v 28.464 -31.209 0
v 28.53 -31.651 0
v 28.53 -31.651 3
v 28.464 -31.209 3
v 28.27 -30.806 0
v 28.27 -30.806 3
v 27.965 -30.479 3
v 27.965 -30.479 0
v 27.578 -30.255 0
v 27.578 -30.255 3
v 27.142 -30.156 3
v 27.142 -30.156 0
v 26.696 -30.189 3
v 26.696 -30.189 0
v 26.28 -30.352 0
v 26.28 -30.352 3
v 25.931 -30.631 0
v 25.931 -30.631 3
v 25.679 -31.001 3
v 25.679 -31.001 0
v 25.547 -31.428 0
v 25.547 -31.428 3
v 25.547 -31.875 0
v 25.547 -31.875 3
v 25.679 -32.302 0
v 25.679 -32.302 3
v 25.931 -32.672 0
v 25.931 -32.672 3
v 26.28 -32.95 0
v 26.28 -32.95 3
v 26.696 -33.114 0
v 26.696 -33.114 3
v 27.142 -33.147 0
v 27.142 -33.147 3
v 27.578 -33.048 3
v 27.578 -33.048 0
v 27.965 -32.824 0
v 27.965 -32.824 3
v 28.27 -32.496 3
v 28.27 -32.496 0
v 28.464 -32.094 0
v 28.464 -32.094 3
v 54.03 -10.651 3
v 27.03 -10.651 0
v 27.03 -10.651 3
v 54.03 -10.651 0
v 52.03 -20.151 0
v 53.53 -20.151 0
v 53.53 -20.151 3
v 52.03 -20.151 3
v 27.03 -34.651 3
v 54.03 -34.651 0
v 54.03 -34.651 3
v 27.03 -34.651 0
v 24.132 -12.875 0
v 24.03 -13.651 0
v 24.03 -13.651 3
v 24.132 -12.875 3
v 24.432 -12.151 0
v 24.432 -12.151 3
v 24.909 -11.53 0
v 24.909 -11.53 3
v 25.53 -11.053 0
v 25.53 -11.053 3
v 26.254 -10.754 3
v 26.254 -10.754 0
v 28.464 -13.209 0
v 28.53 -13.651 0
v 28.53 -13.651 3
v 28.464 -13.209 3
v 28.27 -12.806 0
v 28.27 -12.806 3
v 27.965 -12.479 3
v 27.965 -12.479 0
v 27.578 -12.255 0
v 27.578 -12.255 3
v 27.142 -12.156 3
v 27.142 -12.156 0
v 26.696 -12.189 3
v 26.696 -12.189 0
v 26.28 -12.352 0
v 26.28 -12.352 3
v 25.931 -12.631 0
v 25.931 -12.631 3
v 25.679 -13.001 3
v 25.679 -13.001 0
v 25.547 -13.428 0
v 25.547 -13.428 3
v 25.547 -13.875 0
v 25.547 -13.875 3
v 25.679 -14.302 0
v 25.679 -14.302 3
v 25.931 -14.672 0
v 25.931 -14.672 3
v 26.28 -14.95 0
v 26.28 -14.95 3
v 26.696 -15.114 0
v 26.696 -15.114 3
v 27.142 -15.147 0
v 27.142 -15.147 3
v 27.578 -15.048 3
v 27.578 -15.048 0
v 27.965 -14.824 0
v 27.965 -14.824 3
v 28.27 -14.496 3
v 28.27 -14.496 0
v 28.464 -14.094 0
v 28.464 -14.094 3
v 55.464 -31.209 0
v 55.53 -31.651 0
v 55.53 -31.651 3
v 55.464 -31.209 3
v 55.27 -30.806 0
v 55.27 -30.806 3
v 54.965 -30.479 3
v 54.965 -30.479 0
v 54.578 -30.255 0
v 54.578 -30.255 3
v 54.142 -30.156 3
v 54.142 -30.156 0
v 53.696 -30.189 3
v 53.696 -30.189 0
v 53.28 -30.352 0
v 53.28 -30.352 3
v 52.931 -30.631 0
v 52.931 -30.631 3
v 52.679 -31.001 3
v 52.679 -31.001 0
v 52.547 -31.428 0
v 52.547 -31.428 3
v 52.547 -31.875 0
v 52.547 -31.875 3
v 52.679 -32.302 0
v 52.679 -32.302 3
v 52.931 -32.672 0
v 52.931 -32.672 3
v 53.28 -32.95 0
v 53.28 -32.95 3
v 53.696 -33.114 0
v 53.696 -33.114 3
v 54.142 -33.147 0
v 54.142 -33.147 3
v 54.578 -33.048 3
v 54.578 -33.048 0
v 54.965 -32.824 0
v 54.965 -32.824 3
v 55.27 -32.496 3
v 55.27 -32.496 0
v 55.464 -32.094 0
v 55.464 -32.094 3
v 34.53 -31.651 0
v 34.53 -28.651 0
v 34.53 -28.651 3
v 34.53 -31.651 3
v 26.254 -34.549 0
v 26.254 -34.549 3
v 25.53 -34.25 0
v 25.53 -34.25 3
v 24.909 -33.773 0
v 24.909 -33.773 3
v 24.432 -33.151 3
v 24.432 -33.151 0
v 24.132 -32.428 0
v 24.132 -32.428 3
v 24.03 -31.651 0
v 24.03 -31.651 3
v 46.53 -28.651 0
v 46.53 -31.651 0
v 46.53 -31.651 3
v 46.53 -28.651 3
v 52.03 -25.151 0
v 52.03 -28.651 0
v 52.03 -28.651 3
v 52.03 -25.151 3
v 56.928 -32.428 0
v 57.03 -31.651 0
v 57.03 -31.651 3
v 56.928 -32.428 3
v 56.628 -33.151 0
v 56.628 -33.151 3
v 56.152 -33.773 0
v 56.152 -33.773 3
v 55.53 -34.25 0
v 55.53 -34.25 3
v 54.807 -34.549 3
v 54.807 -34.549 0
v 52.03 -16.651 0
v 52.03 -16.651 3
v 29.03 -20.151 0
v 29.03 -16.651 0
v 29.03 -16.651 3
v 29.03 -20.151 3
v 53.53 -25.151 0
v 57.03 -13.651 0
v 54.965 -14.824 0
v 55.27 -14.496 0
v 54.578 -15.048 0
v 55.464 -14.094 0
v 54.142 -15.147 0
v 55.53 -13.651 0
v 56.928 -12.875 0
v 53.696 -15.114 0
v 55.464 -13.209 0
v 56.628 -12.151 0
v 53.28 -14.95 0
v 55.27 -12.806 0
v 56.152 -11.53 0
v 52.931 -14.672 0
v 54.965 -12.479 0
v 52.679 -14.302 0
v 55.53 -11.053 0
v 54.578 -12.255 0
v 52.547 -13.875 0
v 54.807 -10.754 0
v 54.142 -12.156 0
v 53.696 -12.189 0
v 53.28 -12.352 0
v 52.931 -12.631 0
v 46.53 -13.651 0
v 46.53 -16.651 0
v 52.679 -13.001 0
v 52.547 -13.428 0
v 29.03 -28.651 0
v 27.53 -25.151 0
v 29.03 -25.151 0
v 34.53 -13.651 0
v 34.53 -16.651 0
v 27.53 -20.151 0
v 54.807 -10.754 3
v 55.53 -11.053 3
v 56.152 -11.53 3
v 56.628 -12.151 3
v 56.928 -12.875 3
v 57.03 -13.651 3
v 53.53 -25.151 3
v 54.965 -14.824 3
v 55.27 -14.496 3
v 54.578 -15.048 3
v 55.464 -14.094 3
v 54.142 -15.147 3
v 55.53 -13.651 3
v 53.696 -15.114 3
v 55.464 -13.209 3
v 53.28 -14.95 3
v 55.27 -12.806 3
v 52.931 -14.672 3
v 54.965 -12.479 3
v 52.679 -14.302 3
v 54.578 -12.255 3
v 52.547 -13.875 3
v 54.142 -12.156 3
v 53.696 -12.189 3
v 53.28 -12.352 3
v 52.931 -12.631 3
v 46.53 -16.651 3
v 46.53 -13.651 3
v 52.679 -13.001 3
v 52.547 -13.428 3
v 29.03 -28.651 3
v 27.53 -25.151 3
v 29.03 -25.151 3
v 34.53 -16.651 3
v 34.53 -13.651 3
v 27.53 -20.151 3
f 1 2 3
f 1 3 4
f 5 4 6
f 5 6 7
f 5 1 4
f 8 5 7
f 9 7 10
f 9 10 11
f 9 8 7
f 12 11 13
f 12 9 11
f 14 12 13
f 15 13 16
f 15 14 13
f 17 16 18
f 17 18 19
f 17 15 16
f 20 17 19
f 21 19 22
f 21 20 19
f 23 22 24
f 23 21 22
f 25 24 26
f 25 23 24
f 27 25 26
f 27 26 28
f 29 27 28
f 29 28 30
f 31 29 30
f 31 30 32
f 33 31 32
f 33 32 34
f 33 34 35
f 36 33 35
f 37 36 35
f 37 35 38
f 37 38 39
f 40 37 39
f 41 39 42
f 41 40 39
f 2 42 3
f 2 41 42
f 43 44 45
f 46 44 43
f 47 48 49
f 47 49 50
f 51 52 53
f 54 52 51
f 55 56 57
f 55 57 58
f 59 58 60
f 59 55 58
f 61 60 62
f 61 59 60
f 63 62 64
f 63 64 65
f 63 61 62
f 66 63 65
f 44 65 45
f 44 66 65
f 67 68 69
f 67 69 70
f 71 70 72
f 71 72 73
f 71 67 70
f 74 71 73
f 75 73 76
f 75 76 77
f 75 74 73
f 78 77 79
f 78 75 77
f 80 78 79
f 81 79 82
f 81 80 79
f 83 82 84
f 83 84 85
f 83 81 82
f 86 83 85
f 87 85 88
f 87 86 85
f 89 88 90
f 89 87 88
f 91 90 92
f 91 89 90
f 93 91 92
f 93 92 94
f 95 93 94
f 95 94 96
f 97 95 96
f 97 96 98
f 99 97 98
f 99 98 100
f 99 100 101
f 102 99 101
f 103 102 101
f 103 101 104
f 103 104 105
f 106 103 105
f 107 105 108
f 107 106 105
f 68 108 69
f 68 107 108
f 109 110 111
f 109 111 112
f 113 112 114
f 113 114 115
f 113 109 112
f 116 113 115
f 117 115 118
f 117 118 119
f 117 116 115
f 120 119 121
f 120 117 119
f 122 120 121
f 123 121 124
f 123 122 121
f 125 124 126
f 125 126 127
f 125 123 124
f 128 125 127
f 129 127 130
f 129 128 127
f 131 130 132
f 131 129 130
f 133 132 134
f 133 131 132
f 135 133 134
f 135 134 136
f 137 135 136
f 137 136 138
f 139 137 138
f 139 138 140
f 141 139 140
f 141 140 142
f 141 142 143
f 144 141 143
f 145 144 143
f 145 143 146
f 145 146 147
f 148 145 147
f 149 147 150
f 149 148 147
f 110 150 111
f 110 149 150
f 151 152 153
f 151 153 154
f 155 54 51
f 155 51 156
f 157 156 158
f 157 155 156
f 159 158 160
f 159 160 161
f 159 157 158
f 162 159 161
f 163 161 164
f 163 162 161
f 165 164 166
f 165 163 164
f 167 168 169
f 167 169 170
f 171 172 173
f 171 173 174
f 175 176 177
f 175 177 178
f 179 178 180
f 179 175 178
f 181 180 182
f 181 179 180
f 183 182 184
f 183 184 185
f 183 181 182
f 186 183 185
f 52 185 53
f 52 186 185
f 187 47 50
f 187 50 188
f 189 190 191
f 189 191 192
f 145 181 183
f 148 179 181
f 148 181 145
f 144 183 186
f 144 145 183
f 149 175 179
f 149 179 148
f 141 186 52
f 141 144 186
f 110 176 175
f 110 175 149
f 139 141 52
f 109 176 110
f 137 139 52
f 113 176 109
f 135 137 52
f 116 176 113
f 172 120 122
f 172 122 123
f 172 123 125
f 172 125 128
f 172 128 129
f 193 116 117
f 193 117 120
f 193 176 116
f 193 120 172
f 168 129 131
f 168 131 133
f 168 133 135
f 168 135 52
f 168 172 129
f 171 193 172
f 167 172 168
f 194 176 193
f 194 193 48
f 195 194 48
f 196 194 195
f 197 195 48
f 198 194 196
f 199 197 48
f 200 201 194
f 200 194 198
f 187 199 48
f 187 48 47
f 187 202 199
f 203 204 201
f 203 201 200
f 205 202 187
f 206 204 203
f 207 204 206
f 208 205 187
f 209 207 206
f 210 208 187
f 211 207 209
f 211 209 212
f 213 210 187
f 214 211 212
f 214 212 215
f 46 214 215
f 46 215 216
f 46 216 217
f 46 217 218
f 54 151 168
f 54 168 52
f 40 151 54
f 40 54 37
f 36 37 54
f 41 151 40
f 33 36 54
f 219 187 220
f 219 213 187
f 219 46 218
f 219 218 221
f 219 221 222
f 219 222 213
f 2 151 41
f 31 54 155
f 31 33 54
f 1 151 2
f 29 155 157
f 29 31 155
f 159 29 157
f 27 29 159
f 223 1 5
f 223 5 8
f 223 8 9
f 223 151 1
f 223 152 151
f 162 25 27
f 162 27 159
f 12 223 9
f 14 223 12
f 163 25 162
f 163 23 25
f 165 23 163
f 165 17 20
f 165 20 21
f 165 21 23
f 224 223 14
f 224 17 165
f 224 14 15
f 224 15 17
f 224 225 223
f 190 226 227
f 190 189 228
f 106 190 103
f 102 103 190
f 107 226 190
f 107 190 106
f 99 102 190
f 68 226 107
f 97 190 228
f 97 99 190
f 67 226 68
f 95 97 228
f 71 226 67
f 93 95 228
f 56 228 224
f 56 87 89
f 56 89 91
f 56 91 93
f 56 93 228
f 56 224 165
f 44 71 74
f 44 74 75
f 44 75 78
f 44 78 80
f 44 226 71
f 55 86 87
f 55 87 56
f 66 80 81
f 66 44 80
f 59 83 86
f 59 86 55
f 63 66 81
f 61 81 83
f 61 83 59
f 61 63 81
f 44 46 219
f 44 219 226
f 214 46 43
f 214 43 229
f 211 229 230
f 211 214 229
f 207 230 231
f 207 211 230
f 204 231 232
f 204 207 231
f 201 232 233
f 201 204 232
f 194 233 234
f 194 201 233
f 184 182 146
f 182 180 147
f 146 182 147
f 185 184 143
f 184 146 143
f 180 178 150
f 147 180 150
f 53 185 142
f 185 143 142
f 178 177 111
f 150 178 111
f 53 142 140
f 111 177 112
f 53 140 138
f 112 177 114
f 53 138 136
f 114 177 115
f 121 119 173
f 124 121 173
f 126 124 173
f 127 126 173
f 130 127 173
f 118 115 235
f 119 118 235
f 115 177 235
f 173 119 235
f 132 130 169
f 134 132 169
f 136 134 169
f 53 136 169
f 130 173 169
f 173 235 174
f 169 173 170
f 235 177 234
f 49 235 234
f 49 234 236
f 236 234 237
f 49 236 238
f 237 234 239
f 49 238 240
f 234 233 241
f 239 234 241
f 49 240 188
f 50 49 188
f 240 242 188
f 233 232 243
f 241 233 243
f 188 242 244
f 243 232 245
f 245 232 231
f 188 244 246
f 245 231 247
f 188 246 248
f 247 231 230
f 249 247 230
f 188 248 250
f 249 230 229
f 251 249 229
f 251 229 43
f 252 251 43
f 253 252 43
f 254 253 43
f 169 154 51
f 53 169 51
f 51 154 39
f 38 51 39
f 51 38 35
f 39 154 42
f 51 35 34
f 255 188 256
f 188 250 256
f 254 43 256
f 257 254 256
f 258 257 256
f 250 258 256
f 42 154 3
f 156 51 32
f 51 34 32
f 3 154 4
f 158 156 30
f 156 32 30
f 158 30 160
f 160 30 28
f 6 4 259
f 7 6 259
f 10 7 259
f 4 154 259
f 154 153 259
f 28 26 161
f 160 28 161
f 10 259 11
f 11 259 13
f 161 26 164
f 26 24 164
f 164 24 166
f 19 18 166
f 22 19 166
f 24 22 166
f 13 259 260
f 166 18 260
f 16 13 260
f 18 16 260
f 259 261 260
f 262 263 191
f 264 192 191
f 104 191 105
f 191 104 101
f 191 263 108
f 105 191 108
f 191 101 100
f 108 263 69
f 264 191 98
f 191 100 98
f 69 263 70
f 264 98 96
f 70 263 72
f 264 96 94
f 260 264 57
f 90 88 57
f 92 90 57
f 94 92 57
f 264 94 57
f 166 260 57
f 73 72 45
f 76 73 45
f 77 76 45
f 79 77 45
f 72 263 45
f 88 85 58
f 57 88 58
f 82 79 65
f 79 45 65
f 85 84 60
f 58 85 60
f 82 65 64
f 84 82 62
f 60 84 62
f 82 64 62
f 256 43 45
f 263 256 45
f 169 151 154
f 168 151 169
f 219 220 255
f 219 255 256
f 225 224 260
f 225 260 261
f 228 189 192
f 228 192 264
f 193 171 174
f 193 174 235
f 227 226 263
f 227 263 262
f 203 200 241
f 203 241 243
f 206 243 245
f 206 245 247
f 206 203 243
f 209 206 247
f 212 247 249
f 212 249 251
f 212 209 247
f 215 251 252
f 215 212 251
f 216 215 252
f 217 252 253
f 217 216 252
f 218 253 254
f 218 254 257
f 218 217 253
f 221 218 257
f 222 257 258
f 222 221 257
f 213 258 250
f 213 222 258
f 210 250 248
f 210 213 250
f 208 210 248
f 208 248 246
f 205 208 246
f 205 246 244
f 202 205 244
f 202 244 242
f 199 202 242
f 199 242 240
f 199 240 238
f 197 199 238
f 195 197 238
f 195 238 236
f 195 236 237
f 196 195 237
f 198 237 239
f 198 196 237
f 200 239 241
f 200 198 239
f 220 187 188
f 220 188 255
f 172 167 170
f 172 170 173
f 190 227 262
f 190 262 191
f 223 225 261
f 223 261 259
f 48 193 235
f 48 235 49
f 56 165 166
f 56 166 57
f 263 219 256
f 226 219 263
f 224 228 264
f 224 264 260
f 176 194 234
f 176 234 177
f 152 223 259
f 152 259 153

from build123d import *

# Parameters (mm, degrees)
ESQUISSE16_R        = 1.5
BOSS_EXTRU_16_DEPTH = 3


with BuildPart() as part:
    # Esquisse16 → Boss.-Extru.16 (new body)
    with BuildSketch(Plane.XY):
        with BuildLine():
            Line((27.030251009, -10.651447746), (54.030251009, -10.651447746))
            ThreePointArc((54.030251009, -10.651447746), (56.151571352, -11.530127403), (57.030251009, -13.651447746))
            Line((57.030251009, -13.651447746), (57.030251009, -31.651447746))
            ThreePointArc((57.030251009, -31.651447746), (56.151571352, -33.77276809), (54.030251009, -34.651447746))
            Line((54.030251009, -34.651447746), (27.030251009, -34.651447746))
            ThreePointArc((27.030251009, -34.651447746), (24.908930665, -33.77276809), (24.030251009, -31.651447746))
            Line((24.030251009, -31.651447746), (24.030251009, -13.651447746))
            ThreePointArc((24.030251009, -13.651447746), (24.908930665, -11.530127403), (27.030251009, -10.651447746))
        make_face()
        with Locations((27.030251009, -13.651447746)):
            Circle(ESQUISSE16_R, mode=Mode.SUBTRACT)
        with Locations((54.030251009, -13.651447746)):
            Circle(ESQUISSE16_R, mode=Mode.SUBTRACT)
        with Locations((54.030251009, -31.651447746)):
            Circle(ESQUISSE16_R, mode=Mode.SUBTRACT)
        with Locations((27.030251009, -31.651447746)):
            Circle(ESQUISSE16_R, mode=Mode.SUBTRACT)
        Polygon((29.030251009, -28.651447746), (34.530251009, -28.651447746), (34.530251009, -31.651447746), (46.530251009, -31.651447746), (46.530251009, -28.651447746), (52.030251009, -28.651447746), (52.030251009, -25.151447746), (53.530251009, -25.151447746), (53.530251009, -20.151447746), (52.030251009, -20.151447746), (52.030251009, -16.651447746), (46.530251009, -16.651447746), (46.530251009, -13.651447746), (34.530251009, -13.651447746), (34.530251009, -16.651447746), (29.030251009, -16.651447746), (29.030251009, -20.151447746), (27.530251009, -20.151447746), (27.530251009, -25.151447746), (29.030251009, -25.151447746), align=None, mode=Mode.SUBTRACT)
    extrude(amount=BOSS_EXTRU_16_DEPTH)


solid = part.part
